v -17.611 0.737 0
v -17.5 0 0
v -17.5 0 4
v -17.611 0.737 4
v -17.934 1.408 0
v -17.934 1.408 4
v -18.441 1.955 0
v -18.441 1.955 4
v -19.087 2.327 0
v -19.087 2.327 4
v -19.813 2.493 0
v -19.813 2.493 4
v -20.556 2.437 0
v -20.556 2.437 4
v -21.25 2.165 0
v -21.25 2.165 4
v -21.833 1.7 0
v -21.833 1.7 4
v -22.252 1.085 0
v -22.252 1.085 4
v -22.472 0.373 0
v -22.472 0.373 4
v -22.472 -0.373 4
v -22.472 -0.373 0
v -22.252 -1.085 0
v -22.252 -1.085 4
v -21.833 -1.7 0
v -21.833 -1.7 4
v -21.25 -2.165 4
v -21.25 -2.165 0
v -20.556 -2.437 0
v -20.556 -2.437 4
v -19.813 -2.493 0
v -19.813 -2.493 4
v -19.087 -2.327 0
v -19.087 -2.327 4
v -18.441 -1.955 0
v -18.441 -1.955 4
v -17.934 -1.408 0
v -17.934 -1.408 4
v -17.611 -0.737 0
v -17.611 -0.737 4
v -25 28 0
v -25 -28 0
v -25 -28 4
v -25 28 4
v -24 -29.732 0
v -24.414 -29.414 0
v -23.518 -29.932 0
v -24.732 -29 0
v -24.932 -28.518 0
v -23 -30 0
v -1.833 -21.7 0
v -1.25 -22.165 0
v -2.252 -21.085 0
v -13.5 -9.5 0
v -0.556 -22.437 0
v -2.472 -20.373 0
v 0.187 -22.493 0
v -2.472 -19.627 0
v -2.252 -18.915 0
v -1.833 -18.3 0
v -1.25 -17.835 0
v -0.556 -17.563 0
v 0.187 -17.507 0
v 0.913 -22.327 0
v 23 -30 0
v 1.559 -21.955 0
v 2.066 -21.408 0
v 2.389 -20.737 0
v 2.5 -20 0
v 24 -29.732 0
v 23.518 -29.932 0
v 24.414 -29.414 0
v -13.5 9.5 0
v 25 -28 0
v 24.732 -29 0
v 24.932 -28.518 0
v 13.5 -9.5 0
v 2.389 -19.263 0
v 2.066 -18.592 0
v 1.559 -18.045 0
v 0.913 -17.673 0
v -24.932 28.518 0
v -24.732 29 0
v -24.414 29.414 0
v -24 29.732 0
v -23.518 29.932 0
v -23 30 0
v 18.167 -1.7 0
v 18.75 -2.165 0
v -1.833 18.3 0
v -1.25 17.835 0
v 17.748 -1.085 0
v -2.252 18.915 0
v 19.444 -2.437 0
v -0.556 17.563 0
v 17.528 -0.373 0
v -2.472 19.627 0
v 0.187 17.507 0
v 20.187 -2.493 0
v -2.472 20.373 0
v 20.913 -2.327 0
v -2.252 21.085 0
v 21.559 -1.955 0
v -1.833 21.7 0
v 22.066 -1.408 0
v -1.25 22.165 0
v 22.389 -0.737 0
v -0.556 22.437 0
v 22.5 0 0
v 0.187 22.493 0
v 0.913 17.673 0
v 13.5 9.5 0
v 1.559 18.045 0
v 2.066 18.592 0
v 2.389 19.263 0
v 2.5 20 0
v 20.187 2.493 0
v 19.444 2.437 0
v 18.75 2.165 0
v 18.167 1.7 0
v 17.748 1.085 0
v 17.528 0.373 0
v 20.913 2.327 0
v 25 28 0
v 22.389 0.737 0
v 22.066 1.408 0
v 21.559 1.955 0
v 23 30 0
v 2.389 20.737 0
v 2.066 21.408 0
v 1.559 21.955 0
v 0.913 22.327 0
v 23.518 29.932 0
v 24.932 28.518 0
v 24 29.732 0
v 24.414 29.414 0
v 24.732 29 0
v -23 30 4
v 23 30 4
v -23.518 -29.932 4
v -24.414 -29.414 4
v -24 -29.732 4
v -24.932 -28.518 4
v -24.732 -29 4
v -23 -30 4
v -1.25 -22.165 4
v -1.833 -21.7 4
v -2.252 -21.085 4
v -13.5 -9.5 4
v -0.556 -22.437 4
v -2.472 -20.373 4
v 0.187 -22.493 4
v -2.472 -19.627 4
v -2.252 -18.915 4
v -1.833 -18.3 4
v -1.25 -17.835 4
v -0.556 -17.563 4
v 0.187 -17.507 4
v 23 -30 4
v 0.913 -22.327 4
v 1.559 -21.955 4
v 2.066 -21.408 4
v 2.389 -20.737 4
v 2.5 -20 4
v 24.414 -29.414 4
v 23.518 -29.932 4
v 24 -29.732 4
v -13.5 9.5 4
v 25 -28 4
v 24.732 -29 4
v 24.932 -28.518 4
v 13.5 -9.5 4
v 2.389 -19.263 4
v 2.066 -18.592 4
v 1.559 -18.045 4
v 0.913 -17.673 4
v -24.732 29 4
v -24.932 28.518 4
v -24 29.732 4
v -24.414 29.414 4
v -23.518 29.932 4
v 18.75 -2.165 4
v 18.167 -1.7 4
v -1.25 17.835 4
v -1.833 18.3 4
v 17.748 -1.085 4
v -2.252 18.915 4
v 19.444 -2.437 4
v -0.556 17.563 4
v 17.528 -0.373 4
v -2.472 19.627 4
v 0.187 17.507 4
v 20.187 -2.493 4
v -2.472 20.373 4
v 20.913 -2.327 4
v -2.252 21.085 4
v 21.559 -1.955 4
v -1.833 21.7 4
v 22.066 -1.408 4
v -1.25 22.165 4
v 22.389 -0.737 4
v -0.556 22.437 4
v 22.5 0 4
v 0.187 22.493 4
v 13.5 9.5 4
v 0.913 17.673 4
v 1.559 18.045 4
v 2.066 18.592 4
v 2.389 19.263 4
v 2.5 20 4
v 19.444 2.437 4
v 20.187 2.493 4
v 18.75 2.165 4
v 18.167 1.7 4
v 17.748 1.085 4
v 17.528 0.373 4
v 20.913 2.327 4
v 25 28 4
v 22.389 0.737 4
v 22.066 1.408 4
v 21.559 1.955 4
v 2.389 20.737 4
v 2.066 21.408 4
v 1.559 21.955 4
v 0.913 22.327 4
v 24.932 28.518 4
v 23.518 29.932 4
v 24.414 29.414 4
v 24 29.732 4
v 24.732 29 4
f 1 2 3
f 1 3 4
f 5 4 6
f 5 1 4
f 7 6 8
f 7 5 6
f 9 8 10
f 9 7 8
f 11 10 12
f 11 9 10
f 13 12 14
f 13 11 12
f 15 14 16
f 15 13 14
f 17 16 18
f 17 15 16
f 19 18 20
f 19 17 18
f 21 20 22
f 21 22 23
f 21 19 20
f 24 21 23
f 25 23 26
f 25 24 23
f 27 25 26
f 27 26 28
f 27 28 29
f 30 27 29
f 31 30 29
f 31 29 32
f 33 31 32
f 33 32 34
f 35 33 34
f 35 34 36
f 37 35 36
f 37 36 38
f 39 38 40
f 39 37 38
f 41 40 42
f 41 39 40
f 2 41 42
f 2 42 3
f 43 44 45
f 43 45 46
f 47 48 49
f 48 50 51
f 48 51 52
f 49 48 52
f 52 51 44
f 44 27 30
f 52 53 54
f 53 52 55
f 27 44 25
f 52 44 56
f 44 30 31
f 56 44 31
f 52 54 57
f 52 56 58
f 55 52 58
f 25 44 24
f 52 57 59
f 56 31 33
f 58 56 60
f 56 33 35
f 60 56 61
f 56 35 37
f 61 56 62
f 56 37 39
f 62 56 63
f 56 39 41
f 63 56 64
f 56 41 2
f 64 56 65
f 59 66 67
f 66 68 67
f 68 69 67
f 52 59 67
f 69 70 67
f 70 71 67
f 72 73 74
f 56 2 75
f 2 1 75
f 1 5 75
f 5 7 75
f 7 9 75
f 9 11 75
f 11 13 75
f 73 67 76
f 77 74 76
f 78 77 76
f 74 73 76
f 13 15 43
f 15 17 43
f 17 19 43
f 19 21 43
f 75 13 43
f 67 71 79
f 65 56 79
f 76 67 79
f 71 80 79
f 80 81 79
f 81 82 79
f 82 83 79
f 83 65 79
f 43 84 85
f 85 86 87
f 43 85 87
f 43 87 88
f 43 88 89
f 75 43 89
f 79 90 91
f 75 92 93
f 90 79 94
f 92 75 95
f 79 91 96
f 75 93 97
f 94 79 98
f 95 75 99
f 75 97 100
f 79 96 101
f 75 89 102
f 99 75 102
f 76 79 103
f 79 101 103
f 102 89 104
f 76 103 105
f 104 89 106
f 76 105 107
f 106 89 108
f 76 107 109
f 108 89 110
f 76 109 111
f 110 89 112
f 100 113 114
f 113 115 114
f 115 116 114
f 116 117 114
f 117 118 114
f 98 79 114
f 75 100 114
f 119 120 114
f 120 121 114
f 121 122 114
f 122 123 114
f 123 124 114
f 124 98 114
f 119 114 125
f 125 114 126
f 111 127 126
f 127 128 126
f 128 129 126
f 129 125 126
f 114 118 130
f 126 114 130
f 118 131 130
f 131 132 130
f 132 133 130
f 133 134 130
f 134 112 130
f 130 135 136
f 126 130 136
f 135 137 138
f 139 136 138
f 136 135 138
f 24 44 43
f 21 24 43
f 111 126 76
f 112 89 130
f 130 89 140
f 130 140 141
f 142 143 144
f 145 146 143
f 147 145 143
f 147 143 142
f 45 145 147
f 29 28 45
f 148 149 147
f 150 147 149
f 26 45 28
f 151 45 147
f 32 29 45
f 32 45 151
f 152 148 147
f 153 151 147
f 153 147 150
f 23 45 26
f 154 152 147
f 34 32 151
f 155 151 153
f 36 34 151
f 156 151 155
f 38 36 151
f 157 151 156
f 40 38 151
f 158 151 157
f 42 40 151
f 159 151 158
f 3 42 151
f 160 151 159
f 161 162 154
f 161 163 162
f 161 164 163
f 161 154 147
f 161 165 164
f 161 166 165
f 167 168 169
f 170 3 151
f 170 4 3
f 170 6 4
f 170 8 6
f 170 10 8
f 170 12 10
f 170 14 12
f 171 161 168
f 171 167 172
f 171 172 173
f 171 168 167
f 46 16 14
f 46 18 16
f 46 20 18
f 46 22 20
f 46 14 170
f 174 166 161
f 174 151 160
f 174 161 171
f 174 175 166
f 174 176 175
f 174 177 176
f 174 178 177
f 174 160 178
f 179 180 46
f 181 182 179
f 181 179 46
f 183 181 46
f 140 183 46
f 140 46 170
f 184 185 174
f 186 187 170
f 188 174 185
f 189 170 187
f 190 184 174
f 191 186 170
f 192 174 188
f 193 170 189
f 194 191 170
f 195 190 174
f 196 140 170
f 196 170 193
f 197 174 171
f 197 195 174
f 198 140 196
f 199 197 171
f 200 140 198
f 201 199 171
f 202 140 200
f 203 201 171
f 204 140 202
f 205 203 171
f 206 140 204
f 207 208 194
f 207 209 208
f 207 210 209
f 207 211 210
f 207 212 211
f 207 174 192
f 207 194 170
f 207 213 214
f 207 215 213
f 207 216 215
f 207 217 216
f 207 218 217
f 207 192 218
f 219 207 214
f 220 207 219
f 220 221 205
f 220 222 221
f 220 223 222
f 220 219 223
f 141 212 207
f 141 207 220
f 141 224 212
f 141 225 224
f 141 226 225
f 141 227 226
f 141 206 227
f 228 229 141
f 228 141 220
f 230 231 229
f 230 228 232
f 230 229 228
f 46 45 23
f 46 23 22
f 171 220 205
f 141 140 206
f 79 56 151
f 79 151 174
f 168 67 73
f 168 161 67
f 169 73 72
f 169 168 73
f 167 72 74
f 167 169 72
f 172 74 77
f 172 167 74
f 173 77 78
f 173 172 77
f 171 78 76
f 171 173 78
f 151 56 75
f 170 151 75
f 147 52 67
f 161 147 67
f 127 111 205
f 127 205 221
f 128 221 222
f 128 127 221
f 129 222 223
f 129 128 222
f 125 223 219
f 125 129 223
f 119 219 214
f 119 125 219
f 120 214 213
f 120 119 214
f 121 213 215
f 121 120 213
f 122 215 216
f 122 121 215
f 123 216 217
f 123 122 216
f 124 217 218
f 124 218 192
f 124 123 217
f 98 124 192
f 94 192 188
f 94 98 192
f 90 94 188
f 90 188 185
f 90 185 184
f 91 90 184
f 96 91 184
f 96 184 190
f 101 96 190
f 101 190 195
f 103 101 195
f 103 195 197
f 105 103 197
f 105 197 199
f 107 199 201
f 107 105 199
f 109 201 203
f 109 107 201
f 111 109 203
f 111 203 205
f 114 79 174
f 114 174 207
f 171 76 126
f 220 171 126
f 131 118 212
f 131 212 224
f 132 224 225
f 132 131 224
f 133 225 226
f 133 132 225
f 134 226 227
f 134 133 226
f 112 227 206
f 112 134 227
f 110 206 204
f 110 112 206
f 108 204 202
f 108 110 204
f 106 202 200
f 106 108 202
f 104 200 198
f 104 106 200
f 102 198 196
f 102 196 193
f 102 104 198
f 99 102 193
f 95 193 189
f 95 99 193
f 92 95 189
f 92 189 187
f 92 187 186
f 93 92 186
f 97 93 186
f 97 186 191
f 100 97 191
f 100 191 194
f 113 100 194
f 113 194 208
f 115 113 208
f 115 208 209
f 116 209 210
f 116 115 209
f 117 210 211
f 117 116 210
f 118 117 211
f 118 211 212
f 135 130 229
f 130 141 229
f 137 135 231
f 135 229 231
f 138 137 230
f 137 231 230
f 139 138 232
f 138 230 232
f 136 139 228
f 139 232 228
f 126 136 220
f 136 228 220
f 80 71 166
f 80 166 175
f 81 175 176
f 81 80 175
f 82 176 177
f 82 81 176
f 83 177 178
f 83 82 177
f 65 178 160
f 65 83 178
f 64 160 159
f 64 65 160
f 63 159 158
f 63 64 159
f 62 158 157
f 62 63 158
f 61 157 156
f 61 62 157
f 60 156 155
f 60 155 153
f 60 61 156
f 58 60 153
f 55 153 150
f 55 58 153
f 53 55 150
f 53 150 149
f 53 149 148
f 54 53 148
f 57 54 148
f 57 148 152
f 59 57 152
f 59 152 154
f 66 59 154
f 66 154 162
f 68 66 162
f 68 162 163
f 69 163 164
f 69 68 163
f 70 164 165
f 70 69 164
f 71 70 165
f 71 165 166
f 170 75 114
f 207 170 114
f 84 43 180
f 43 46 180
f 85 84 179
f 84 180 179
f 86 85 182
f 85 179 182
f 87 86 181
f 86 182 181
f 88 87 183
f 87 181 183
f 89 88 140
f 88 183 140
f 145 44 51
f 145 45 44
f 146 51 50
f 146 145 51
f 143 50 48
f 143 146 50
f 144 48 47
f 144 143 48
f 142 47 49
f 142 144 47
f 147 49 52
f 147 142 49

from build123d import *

# Parameters (mm, degrees)
F0_W     = 50
F0_H     = 60
F0_R     = 2.5
F0_W_2   = 27
F0_H_2   = 19
F1_DEPTH = 4
F2_R     = 2


with BuildPart() as f1:
    # F0 (on Top) → F1 (new body)
    with BuildSketch(Plane.XY):
        Rectangle(F0_W, F0_H)
        with Locations((0, -20)):
            Circle(F0_R, mode=Mode.SUBTRACT)
        with Locations((-20, 0)):
            Circle(F0_R, mode=Mode.SUBTRACT)
        Rectangle(F0_W_2, F0_H_2, mode=Mode.SUBTRACT)
        with Locations((20, 0)):
            Circle(F0_R, mode=Mode.SUBTRACT)
        with Locations((0, 20)):
            Circle(F0_R, mode=Mode.SUBTRACT)
    extrude(amount=F1_DEPTH)

    # F2
    f2_edges = [f1.edges().sort_by_distance(p)[0] for p in [
        (25, 30, 2),
        (25, -30, 2),
        (-25, 30, 2),
        (-25, -30, 2),
    ]]
    fillet(f2_edges, radius=F2_R)


solid = f1.part
